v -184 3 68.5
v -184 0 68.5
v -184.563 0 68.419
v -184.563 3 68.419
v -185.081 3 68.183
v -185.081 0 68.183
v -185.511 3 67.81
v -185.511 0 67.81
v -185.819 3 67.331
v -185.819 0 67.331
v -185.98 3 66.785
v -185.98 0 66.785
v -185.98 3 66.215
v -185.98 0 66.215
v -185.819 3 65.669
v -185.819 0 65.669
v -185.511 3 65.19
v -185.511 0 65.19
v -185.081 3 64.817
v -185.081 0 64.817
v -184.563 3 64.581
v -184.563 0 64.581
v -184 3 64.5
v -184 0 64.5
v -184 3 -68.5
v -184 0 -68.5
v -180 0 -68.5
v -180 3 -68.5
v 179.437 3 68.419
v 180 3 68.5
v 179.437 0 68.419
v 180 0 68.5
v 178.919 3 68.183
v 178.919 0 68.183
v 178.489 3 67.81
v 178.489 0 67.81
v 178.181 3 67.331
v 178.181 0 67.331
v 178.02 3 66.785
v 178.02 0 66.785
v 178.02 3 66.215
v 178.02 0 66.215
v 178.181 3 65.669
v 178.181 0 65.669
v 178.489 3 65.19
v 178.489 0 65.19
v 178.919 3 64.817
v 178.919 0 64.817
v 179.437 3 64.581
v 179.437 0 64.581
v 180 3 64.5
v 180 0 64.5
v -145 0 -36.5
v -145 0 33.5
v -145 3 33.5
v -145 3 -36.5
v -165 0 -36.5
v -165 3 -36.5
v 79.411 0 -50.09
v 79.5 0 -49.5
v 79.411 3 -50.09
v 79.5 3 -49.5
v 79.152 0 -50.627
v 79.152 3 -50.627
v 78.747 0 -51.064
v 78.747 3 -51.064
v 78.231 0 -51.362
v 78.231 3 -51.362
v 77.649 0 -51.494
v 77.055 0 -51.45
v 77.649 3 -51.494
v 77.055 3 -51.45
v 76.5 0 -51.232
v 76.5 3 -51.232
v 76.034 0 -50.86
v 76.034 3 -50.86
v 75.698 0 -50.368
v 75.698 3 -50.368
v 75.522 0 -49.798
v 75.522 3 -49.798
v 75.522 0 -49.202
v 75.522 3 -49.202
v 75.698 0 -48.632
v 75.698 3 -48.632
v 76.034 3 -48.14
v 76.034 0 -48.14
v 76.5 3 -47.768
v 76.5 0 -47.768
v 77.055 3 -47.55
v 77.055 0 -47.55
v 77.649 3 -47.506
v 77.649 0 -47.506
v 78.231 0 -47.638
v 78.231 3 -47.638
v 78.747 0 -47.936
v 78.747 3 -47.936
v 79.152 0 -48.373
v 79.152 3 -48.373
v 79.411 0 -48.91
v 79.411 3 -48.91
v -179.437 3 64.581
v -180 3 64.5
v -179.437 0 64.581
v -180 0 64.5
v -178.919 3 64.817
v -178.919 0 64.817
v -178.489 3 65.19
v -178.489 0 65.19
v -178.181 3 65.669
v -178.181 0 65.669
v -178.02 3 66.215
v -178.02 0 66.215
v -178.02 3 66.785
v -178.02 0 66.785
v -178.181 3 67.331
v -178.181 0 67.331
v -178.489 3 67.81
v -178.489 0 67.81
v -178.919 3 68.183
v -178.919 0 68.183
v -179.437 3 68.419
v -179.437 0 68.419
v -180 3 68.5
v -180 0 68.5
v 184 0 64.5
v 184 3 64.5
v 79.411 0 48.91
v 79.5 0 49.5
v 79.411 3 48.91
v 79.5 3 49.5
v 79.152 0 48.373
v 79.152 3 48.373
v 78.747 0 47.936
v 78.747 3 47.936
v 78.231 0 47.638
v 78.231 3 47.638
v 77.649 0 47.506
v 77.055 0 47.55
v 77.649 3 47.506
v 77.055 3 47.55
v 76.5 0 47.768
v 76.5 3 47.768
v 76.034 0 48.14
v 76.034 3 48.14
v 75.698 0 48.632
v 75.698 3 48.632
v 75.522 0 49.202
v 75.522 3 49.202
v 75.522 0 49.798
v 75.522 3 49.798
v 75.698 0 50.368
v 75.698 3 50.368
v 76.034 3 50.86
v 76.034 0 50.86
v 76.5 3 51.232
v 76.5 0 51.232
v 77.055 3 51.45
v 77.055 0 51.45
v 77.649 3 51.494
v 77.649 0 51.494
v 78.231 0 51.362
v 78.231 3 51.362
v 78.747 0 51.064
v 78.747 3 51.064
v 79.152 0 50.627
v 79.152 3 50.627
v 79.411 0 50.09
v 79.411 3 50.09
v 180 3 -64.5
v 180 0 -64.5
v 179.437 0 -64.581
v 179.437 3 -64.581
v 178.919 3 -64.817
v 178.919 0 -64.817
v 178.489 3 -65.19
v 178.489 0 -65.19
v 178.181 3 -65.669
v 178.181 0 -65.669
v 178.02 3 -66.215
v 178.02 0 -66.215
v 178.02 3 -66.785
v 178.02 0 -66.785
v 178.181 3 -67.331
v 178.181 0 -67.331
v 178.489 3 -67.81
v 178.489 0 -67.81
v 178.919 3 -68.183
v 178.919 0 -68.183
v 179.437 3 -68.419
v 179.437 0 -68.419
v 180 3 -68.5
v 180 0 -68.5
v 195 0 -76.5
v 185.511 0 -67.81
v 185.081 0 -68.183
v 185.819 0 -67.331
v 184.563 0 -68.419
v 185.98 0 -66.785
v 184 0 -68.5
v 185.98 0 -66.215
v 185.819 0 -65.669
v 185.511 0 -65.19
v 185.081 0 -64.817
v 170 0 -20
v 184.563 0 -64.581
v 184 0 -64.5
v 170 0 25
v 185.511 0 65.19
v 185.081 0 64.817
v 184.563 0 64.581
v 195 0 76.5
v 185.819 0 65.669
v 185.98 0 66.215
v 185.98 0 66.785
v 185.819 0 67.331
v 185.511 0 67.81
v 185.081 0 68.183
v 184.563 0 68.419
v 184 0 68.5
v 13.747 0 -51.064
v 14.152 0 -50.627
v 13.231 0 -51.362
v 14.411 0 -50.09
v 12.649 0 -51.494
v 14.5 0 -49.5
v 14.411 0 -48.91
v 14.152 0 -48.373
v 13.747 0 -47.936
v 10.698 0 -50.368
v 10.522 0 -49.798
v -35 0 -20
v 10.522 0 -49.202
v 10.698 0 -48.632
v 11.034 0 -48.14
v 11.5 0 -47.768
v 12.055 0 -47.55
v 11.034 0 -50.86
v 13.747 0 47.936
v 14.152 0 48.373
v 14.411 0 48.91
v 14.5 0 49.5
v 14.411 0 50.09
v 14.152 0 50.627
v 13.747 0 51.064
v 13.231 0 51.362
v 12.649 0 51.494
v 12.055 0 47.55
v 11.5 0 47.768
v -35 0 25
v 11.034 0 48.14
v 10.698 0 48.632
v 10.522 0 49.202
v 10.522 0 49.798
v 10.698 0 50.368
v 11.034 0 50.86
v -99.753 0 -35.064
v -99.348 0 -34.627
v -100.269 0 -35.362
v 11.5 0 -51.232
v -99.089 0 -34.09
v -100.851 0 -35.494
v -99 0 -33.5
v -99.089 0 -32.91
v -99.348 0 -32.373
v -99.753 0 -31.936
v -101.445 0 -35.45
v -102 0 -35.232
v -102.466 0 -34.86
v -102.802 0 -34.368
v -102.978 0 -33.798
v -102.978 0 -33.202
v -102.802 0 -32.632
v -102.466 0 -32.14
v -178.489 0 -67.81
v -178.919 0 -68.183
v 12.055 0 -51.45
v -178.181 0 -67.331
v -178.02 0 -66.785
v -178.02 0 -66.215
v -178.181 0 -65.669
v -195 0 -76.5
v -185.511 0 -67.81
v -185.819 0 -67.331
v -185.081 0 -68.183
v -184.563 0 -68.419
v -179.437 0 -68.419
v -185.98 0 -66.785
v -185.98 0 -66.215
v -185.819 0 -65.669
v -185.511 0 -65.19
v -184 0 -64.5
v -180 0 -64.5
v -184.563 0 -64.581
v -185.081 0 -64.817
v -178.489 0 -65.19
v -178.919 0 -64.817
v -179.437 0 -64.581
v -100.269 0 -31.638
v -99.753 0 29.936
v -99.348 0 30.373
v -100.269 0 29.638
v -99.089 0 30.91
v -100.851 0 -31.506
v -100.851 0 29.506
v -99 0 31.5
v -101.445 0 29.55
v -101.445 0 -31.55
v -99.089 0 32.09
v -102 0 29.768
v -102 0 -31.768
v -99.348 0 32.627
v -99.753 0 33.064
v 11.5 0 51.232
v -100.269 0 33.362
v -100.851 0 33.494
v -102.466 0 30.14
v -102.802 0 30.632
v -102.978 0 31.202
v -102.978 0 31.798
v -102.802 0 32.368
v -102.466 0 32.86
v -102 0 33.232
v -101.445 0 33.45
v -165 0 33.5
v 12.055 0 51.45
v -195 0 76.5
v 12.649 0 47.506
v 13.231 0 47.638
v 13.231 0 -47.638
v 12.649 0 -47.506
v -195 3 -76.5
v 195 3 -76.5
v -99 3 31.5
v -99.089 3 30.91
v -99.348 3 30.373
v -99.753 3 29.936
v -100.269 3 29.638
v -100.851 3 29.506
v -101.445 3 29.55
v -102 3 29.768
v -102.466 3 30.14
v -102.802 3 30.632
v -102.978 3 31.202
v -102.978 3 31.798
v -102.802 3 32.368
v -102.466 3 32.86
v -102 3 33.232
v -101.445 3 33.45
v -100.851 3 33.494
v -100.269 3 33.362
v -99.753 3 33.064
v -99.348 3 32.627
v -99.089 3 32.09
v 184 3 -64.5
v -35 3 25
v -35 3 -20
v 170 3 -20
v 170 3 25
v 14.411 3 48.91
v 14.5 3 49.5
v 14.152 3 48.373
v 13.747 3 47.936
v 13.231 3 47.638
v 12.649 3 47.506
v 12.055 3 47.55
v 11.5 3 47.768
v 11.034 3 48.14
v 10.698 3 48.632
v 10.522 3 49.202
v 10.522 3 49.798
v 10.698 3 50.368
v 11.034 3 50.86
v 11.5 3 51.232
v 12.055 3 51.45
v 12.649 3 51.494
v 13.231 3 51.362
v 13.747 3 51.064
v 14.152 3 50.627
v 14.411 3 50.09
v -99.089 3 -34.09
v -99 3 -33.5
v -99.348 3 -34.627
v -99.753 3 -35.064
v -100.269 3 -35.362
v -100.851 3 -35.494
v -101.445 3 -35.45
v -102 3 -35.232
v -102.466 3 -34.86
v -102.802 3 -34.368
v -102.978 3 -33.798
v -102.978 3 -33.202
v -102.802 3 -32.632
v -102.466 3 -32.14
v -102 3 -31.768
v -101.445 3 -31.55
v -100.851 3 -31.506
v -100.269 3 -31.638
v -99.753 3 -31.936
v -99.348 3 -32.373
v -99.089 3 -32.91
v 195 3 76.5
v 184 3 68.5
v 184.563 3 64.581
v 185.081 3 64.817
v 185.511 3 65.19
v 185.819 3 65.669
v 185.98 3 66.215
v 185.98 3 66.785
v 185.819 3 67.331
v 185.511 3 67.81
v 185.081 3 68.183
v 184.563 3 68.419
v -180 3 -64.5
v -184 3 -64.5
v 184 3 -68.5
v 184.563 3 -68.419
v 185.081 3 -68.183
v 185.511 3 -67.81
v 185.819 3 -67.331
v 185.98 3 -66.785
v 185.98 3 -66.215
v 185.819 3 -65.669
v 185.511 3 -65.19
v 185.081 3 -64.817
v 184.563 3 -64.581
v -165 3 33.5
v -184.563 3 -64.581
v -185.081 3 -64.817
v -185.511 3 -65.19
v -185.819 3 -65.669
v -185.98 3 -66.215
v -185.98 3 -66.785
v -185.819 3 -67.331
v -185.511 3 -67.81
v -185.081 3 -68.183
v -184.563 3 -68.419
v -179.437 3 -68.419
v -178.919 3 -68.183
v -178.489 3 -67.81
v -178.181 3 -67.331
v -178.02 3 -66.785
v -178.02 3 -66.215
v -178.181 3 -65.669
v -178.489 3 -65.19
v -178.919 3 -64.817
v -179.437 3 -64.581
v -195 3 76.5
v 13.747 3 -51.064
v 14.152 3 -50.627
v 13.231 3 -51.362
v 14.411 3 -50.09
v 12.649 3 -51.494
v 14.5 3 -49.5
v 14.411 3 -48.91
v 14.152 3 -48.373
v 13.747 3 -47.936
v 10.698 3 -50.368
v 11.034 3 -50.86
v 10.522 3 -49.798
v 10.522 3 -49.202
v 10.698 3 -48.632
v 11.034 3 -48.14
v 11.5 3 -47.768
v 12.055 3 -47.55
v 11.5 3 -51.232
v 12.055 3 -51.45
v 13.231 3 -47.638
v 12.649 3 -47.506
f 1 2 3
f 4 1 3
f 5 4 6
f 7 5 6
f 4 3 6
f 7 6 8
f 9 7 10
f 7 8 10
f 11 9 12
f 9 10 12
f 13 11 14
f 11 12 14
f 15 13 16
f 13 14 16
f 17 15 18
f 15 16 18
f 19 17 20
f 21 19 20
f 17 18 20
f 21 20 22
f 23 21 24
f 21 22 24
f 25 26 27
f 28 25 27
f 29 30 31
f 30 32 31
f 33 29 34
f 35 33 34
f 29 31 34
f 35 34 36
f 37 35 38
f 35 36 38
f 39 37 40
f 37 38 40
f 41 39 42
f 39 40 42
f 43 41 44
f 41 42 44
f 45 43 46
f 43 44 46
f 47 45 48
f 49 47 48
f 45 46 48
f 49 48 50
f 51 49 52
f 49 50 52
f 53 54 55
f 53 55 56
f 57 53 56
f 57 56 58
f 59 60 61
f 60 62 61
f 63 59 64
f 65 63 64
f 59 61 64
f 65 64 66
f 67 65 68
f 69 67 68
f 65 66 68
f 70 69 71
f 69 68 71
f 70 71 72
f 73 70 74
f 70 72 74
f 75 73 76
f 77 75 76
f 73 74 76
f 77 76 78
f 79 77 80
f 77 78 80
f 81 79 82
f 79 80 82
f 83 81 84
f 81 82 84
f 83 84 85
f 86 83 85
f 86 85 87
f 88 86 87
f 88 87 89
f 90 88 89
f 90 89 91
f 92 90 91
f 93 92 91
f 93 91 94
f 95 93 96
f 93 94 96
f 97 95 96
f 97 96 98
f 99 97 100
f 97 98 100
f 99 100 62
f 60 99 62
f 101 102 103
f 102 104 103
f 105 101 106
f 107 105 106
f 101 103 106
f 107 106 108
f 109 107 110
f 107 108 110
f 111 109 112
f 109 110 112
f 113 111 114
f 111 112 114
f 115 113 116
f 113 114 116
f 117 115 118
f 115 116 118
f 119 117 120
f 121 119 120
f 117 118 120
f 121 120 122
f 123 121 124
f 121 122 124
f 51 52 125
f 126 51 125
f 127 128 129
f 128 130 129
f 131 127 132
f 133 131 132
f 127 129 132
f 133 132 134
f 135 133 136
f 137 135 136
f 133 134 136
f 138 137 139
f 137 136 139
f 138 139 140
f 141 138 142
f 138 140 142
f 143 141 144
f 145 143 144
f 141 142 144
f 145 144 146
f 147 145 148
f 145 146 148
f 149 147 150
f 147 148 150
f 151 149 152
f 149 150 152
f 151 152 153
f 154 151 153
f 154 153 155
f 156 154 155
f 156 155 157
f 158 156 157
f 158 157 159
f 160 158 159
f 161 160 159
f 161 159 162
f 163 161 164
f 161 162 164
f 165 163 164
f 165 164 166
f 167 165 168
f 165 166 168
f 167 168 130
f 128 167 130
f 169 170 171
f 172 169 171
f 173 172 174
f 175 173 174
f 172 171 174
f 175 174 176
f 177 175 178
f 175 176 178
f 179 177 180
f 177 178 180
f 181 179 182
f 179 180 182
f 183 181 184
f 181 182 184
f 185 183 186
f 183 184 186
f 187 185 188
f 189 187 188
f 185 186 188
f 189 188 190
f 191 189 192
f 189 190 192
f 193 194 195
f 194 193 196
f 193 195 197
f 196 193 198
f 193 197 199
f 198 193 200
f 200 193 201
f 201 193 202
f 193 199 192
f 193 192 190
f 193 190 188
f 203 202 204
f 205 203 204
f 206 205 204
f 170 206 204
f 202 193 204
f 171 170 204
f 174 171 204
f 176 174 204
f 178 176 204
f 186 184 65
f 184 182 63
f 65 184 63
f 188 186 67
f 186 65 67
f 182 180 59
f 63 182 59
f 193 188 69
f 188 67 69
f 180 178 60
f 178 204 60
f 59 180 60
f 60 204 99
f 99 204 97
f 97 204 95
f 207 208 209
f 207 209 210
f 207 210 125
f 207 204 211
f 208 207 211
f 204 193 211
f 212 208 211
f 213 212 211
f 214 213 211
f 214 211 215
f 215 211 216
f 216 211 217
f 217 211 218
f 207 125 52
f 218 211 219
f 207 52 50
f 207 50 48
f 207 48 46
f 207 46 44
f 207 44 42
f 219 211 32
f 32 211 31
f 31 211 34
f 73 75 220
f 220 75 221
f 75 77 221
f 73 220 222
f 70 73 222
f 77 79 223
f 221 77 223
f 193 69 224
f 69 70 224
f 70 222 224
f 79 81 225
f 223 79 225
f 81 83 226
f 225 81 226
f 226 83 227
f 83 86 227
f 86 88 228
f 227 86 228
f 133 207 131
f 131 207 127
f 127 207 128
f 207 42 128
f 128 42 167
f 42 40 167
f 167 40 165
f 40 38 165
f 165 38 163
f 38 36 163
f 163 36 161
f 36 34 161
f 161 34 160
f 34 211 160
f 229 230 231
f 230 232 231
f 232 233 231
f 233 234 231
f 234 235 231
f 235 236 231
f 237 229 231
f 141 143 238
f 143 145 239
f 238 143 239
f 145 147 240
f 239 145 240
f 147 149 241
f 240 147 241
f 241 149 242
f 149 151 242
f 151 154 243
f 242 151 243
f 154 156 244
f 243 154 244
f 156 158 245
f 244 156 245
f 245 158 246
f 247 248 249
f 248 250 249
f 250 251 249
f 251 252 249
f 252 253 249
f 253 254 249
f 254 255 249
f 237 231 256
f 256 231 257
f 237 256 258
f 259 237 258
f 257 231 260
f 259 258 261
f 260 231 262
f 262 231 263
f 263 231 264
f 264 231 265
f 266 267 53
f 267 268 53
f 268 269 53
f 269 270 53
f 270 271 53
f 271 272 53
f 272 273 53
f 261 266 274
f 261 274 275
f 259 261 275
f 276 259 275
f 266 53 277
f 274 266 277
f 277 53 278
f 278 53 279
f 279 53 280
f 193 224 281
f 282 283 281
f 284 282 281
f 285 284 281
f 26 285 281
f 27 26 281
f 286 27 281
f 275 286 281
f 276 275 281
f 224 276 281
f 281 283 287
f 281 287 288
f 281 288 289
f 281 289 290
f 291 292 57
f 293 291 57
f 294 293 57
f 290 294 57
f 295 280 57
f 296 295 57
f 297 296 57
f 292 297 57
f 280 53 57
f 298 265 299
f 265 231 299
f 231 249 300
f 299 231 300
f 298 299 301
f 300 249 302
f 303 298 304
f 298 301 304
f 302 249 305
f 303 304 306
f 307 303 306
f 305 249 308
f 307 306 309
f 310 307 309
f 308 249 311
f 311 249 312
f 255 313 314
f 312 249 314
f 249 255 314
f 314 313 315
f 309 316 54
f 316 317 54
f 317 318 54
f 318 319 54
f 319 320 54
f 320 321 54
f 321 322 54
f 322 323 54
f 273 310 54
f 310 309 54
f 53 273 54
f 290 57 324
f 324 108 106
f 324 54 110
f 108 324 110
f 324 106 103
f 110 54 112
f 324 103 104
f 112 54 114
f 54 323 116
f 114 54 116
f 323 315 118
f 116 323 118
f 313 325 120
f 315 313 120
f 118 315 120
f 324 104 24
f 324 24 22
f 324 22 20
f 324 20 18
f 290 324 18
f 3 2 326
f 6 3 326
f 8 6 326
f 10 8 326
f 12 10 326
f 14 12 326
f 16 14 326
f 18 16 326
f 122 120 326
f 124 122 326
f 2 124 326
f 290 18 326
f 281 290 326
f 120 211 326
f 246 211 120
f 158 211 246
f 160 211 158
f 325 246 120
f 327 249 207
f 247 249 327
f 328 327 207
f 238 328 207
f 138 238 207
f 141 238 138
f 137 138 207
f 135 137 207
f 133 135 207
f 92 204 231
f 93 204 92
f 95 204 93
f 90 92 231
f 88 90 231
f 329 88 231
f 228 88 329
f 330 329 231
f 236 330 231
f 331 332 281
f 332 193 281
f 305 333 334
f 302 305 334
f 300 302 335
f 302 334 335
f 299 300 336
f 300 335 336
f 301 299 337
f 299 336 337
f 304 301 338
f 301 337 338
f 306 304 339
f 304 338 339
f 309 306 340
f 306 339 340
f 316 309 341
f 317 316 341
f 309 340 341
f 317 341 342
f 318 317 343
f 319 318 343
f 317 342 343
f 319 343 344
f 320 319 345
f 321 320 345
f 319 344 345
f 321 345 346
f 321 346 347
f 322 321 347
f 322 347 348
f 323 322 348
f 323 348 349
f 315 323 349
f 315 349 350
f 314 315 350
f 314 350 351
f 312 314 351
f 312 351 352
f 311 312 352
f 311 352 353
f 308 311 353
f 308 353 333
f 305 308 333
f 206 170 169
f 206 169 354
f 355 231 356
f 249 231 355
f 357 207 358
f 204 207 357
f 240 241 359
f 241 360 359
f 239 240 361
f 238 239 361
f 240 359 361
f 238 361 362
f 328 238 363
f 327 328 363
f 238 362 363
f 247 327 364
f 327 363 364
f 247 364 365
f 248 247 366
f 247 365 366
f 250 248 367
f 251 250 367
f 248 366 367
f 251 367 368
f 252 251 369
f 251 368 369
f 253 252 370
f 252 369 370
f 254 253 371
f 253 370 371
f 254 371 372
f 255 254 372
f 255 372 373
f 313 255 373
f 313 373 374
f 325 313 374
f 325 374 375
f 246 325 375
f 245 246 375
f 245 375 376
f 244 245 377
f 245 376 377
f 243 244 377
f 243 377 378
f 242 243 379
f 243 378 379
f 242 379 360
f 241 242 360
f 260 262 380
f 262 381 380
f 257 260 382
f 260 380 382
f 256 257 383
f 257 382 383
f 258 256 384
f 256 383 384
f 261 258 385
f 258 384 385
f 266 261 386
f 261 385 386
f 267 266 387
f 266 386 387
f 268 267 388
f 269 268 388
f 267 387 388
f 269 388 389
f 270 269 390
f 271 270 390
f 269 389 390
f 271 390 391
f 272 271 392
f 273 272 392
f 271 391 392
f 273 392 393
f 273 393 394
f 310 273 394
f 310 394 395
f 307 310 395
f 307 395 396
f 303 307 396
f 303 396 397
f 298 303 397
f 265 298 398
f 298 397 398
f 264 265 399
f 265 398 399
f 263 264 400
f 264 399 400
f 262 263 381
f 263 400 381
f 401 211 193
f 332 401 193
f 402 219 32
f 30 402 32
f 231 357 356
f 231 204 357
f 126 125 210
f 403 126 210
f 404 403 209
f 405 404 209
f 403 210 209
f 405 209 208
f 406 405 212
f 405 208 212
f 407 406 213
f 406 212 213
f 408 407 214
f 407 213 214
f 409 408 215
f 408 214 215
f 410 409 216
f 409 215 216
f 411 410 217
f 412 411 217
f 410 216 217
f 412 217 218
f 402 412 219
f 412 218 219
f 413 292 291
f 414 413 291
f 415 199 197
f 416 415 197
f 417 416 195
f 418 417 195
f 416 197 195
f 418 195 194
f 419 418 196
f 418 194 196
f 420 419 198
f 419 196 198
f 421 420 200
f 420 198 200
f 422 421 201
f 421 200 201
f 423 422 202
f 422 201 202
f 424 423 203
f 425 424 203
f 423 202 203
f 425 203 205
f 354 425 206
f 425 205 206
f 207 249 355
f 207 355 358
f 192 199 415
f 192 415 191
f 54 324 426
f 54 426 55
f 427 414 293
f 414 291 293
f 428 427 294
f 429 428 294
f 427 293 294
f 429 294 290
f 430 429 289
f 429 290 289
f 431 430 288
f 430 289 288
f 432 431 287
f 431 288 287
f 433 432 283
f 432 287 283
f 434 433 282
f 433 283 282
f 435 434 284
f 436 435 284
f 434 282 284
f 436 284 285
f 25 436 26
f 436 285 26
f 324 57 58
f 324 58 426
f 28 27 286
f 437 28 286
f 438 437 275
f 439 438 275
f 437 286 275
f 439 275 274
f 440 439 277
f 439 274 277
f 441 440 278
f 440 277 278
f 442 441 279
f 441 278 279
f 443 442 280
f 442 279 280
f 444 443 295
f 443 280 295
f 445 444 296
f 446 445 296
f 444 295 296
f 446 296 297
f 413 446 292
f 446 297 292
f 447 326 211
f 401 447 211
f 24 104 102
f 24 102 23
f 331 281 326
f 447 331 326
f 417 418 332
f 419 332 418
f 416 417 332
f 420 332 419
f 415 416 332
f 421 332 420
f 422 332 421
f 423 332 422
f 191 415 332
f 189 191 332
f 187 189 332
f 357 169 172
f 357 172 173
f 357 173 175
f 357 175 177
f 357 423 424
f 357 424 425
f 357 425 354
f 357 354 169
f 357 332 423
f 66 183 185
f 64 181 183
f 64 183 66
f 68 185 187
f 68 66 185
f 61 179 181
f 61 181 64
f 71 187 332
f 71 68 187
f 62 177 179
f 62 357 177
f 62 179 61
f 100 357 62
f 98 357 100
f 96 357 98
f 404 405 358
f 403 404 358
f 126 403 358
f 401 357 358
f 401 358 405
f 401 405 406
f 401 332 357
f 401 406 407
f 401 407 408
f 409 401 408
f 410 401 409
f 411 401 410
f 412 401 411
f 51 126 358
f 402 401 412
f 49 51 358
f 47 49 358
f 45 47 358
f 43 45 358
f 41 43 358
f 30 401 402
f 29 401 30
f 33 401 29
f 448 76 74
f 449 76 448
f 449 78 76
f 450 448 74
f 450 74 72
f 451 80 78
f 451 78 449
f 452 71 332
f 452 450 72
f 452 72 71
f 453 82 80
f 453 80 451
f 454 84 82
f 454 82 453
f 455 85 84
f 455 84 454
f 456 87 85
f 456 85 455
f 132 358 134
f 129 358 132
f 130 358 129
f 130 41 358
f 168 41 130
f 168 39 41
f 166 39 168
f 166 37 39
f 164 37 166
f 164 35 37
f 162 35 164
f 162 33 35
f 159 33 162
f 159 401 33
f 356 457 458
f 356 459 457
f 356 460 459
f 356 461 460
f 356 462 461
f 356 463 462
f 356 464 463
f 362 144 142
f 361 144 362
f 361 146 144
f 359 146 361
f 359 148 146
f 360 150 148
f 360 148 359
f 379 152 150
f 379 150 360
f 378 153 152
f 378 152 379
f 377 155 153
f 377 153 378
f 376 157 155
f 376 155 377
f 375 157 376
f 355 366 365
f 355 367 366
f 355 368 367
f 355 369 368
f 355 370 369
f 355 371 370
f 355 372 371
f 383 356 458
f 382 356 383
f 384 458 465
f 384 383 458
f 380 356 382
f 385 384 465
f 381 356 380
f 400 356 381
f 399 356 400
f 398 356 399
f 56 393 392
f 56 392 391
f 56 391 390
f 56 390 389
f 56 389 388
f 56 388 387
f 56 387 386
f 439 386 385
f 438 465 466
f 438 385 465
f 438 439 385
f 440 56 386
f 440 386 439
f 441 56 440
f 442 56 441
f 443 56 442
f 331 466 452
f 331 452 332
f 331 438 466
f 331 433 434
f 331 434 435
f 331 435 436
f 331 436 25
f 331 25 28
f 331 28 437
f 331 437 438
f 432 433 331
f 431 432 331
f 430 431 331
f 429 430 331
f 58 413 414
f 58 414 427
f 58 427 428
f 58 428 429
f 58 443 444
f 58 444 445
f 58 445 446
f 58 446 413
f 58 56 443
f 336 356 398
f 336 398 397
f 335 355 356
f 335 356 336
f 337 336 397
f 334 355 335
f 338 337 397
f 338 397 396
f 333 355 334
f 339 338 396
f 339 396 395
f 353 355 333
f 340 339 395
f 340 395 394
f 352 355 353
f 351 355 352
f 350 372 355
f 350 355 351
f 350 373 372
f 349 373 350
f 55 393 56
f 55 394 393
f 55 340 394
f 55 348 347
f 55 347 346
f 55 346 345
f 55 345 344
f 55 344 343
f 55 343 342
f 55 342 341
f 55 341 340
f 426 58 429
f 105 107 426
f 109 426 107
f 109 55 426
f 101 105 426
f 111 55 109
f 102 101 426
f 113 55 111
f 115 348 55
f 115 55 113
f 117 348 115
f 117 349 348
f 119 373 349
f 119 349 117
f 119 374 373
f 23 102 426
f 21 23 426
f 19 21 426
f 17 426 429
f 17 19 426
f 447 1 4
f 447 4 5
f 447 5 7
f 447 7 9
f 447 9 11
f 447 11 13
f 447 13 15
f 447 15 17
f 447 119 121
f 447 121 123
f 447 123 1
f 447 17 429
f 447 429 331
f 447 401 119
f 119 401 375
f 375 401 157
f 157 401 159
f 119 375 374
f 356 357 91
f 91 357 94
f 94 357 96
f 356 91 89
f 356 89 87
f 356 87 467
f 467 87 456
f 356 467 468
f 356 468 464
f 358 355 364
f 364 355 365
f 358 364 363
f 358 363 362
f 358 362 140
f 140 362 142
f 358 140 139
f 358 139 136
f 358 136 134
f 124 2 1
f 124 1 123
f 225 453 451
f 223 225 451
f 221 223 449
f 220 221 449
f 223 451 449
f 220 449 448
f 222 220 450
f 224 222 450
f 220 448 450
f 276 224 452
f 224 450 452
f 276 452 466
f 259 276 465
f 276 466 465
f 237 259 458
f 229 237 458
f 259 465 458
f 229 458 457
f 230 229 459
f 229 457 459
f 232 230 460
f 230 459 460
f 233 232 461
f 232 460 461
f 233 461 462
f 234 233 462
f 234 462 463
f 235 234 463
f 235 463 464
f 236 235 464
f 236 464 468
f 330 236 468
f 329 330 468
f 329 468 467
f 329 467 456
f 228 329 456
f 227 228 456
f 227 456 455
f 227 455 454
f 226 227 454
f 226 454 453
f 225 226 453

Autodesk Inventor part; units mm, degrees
ref_plane "YZ Plane" through (0, 0, 0) normal (1, 0, 0) x (0, 1, 0)
ref_plane "XZ Plane" through (0, 0, 0) normal (0, 1, 0) x (-1, 0, 0)
ref_plane "XY Plane" through (0, 0, 0) normal (0, 0, 1) x (1, 0, 0)
sketch "스케치1" plane through (0, 0, 0) normal (0, 1, 0) x (-1, 0, 0)
  line L0 (195, 76.5) -> (-195, 76.5)
  line L1 (-195, 76.5) -> (-195, -76.5)
  line L2 (-195, -76.5) -> (195, -76.5)
  line L3 (195, -76.5) -> (195, 76.5)
  line L4 (195, 76.5) -> (-195, -76.5) construction
  line L5 (-195, 76.5) -> (195, -76.5) construction
  point P0 (0, 0)
  dimension "d0" = 390
  dimension "d1" = 153
extrude "돌출1" add sketch "스케치1" along normal blind 3
sketch "스케치2" plane through (0, 3, 0) normal (0, 1, 0) x (1, 0, 0)
  line L0 (-101, -167.7961) -> (-101, 220.4195)
  line L1 (-195, 76.5) -> (-195, -76.5) projected
  line L2 (-195, -76.5) -> (195, -76.5) projected
  circle A0 centre (-101, -31.5) radius 2
  circle A1 centre (-101, 33.5) radius 2
  line L3 (195, -76.5) -> (195, 76.5) projected
  line L4 (-91, -255.1075) -> (-91, 213.2428)
  line L5 (-111, -276.0921) -> (-111, 192.2583)
  line L6 (-190, -202.8267) -> (-190, 265.5236)
  line L7 (190, -180.3404) -> (190, 288.01)
  line L8 (-211.2868, -71.5) -> (199.2371, -71.5)
  circle A2 centre (12.5, -49.5) radius 2
  circle A3 centre (77.5, -49.5) radius 2
  circle A4 centre (12.5, 49.5) radius 2
  circle A5 centre (77.5, 49.5) radius 2
  line L9 (12.5, -49.5) -> (99.2818, -49.5) construction
  line L10 (12.5, 49.5) -> (77.5, 49.5) construction
  line L11 (195, 76.5) -> (-195, 76.5) projected
  dimension "d4" = 94
  dimension "d10" = 4
  dimension "d11" = 4
  dimension "d23" = 10
  dimension "d24" = 10
  dimension "d25" = 5
  dimension "d26" = 5
  dimension "d27" = 5
  dimension "d38" = 4
  dimension "d39" = 4
  dimension "d40" = 4
  dimension "d41" = 4
  dimension "d42" = 65
  dimension "d43" = 65
  dimension "d44" = 117.5
  dimension "d45" = 117.5
  dimension "d46" = 27
  dimension "d47" = 27
extrude "돌출2" cut sketch "스케치2" against normal up to surface (3 mm away) contours A0 L0 | L0 A0 | A1 L0 | L0 A1 | A2 | A3 | A4 | A5
sketch "스케치3" plane through (0, 0, 0) normal (0, -1, 0) x (1, 0, 0)
  line L0 (-35, 25) -> (170, 25)
  line L1 (170, 25) -> (170, -20)
  line L2 (170, -20) -> (-35, -20)
  line L3 (-35, -20) -> (-35, 25)
  line L4 (-35, 25) -> (170, -20) construction
  line L5 (170, 25) -> (-35, -20) construction
  line L6 (195, 76.5) -> (195, -76.5) projected
  line L7 (-165, 33.5) -> (-145, 33.5)
  line L8 (-145, 33.5) -> (-145, -36.5)
  line L9 (-145, -36.5) -> (-165, -36.5)
  line L10 (-165, -36.5) -> (-165, 33.5)
  line L11 (195, -76.5) -> (-195, -76.5) projected
  line L12 (-195, -76.5) -> (-195, 76.5) projected
  point P0 (0, 0)
  point P1 (67.5, 2.5)
  dimension "d28" = 205
  dimension "d29" = 25
  dimension "d30" = 45
  dimension "d31" = 20
  dimension "d34" = 70
  dimension "d35" = 20
  dimension "d36" = 110
  dimension "d37" = 30
extrude "돌출3" cut sketch "스케치3" against normal blind 10
sketch "스케치6" plane through (0, 0, 0) normal (0, -1, 0) x (1, 0, 0)
  line L0 (-184, -66.5) -> (-180, -66.5) construction
  line L1 (-184, -68.5) -> (-180, -68.5)
  line L2 (-180, -64.5) -> (-184, -64.5)
  arc A0 (-184, -64.5) -> (-184, -68.5) centre (-184, -66.5) ccw
  arc A1 (-180, -68.5) -> (-180, -64.5) centre (-180, -66.5) ccw
  line L3 (-195, -76.5) -> (-195, 76.5) projected
  line L4 (195, -76.5) -> (-195, -76.5) projected
  line L5 (0, -8.9008) -> (0, 5.7448)
  line L6 (-2.4122, 0) -> (4.9846, 0)
  line L7 (184, -66.5) -> (180, -66.5) construction
  line L8 (184, -68.5) -> (180, -68.5)
  line L9 (180, -64.5) -> (184, -64.5)
  arc A2 (184, -68.5) -> (184, -64.5) centre (184, -66.5) ccw
  arc A3 (180, -64.5) -> (180, -68.5) centre (180, -66.5) ccw
  line L10 (-184, 66.5) -> (-180, 66.5) construction
  line L11 (-184, 68.5) -> (-180, 68.5)
  line L12 (-180, 64.5) -> (-184, 64.5)
  arc A4 (-184, 68.5) -> (-184, 64.5) centre (-184, 66.5) ccw
  arc A5 (-180, 64.5) -> (-180, 68.5) centre (-180, 66.5) ccw
  line L13 (184, 66.5) -> (180, 66.5) construction
  line L14 (184, 68.5) -> (180, 68.5)
  line L15 (180, 64.5) -> (184, 64.5)
  arc A6 (184, 64.5) -> (184, 68.5) centre (184, 66.5) ccw
  arc A7 (180, 68.5) -> (180, 64.5) centre (180, 66.5) ccw
  point P0 (0, 0)
  point P1 (-182, -66.5)
  point P2 (182, -66.5)
  point P3 (-182, 66.5)
  point P4 (182, 66.5)
  dimension "d87" = 4
  dimension "d88" = 4
  dimension "d89" = 13
  dimension "d90" = 10
extrude "돌출5" cut sketch "스케치6" against normal blind 10
equation "\"d45\" = d44"
equation "\"d47\" = d46"
properties part number "발 받침대 받침_윗면"
